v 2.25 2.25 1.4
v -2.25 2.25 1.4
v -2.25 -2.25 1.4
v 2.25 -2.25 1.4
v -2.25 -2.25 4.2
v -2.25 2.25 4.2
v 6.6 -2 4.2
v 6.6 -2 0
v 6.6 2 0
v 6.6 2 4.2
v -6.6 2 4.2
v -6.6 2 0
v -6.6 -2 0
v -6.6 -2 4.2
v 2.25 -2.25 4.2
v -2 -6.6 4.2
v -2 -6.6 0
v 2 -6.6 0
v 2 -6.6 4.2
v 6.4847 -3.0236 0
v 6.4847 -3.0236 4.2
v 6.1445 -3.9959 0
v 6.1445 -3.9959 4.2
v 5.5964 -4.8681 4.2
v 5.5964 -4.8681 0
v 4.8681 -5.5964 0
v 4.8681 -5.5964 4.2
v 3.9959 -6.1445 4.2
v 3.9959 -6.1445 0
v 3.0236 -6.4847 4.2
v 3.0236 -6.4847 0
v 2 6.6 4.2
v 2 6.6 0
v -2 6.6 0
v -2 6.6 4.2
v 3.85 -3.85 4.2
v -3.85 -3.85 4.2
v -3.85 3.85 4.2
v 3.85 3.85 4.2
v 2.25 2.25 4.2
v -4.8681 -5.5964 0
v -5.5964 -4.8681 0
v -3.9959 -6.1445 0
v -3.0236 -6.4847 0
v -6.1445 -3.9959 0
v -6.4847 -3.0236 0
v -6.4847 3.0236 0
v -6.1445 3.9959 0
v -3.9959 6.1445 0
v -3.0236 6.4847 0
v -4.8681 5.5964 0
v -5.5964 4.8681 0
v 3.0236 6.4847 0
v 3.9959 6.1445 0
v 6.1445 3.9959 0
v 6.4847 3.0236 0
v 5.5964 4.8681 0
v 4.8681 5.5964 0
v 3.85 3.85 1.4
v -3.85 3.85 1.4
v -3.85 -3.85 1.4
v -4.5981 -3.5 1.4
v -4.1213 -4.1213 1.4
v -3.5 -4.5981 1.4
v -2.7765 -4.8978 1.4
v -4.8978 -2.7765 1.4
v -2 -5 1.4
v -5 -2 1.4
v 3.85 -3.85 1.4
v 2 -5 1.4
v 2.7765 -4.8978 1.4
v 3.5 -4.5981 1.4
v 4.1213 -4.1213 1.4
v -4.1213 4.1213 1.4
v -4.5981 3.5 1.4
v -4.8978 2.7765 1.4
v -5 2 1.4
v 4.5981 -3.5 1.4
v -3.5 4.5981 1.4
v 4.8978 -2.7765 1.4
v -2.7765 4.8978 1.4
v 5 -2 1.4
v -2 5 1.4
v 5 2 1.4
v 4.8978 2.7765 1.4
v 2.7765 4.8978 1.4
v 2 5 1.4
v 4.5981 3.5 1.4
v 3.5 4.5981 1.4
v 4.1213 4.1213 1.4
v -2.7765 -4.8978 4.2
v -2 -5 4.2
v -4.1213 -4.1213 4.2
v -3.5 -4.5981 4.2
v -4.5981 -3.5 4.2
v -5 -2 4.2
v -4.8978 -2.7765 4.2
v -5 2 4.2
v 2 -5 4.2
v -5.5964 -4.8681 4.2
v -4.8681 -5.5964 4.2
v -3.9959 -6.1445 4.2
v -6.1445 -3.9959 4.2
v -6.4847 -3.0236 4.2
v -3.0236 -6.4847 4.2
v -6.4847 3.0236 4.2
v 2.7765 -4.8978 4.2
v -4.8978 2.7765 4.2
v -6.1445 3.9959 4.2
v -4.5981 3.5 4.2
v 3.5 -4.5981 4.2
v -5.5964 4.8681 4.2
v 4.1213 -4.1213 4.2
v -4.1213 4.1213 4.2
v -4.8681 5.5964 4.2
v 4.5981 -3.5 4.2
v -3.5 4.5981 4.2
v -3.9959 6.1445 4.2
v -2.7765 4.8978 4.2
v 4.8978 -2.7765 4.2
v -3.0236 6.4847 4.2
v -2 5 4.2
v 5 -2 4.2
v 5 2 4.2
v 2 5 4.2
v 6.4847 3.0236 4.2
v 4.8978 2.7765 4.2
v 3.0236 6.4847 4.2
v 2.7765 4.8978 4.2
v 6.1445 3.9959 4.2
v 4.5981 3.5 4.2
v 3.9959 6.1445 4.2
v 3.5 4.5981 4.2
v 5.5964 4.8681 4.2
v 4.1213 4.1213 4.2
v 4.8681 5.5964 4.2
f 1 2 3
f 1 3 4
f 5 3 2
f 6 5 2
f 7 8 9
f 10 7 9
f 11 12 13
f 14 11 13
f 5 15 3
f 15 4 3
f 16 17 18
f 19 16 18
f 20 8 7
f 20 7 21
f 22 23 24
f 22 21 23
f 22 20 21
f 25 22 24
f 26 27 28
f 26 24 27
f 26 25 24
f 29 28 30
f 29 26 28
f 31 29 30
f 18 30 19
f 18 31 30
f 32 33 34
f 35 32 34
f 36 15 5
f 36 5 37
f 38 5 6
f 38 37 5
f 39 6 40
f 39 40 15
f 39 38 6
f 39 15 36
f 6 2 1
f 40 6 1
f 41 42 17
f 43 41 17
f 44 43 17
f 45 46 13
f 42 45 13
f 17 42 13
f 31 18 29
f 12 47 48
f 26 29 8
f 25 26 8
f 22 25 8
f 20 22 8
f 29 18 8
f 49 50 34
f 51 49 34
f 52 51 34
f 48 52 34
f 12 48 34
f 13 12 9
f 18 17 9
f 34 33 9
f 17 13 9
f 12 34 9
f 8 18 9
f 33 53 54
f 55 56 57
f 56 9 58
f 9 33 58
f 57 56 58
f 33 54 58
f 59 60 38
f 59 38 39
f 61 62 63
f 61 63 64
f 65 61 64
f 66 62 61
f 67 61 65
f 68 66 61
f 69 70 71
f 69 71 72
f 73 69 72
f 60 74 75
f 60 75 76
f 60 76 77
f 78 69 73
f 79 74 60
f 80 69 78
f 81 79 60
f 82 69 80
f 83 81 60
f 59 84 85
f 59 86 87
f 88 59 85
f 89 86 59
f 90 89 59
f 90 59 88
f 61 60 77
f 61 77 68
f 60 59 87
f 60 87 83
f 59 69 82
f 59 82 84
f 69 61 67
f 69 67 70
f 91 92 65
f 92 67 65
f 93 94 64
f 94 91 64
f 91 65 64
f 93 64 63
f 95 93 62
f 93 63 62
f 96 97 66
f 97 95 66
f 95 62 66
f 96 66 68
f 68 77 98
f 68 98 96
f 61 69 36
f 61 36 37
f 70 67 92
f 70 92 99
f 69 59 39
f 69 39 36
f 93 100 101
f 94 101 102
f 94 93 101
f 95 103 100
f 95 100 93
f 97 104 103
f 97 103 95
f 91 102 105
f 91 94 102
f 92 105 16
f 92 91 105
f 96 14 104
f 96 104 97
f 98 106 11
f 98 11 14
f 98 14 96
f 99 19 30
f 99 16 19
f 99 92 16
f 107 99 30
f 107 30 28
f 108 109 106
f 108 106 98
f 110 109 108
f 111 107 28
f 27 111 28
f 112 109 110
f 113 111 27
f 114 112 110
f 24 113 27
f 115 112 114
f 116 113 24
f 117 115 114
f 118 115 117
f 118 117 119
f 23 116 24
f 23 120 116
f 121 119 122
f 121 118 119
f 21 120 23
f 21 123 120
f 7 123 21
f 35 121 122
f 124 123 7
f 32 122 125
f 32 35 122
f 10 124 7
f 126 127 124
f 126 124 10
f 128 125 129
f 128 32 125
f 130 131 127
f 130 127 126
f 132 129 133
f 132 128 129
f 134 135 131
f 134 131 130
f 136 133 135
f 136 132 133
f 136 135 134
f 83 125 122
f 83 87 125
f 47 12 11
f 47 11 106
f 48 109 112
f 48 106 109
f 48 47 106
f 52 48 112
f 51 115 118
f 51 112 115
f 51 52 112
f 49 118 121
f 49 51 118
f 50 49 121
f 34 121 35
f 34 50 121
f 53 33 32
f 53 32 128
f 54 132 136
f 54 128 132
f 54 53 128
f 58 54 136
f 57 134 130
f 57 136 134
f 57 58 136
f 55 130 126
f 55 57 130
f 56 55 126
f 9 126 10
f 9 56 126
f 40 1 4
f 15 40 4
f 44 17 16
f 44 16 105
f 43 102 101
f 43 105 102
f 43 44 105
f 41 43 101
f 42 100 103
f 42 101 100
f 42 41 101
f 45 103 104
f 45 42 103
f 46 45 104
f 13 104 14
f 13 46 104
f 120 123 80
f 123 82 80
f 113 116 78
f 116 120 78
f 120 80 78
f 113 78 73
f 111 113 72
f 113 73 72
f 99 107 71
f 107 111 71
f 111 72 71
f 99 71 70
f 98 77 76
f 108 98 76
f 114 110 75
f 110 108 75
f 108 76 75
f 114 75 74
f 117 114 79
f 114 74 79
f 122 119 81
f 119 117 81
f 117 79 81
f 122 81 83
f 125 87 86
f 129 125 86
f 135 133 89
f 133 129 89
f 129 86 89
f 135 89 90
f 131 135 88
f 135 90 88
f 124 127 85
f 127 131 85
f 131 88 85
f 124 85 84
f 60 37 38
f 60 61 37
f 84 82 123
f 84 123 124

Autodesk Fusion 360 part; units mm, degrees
sketch "Boceto1" plane through (0, 0, 0) normal (0, 0, 1) x (1, 0, 0)
  line L0 (2, 5) -> (-2, 5)
  line L1 (-5, 2) -> (-5, -2)
  line L2 (-2, -5) -> (2, -5)
  line L3 (5, -2) -> (5, 2)
  line L4 (5, 5) -> (-5, -5) construction
  line L5 (-5, 5) -> (5, -5) construction
  line L6 (2.25, -2.25) -> (-2.25, -2.25)
  line L7 (-2.25, -2.25) -> (-2.25, 2.25)
  line L8 (-2.25, 2.25) -> (2.25, 2.25)
  line L9 (2.25, 2.25) -> (2.25, -2.25)
  line L10 (2.25, -2.25) -> (-2.25, 2.25) construction
  line L11 (-2.25, -2.25) -> (2.25, 2.25) construction
  line L12 (3.85, -3.85) -> (-3.85, -3.85)
  line L13 (-3.85, -3.85) -> (-3.85, 3.85)
  line L14 (-3.85, 3.85) -> (3.85, 3.85)
  line L15 (3.85, 3.85) -> (3.85, -3.85)
  arc A0 (-2, 5) -> (-5, 2) centre (-2, 2) ccw
  arc A1 (5, 2) -> (2, 5) centre (2, 2) ccw
  arc A2 (2, -5) -> (5, -2) centre (2, -2) ccw
  arc A3 (-5, -2) -> (-2, -5) centre (-2, -2) ccw
  arc A4 (-6.6, -2) -> (-2, -6.6) centre (-2, -2) ccw
  line L16 (-2, -6.6) -> (2, -6.6)
  arc A5 (2, -6.6) -> (6.6, -2) centre (2, -2) ccw
  line L17 (6.6, -2) -> (6.6, 2)
  arc A6 (6.6, 2) -> (2, 6.6) centre (2, 2) ccw
  line L18 (2, 6.6) -> (-2, 6.6)
  arc A7 (-2, 6.6) -> (-6.6, 2) centre (-2, 2) ccw
  line L19 (-6.6, 2) -> (-6.6, -2)
  dimension "d3" = 10
  dimension "d4" = 10
  dimension "d5" = 4.5
  dimension "d6" = 4.5
  dimension "d7" = -1.6
  dimension "d8" = 3
  dimension "d9" = 1.6
extrude "Extruir1" add sketch "Boceto1" along normal blind 1.4 contours L0 L1 L2 L3 A0 A1 A2 A3 | L6 L7 L8 L9 | L12 L13 L14 L15 | A4 L16 A5 L17 A6 L18 A7 L19
extrude "Extruir2" add sketch "Boceto1" along normal blind 2.8 from surface at 1.4 contours L12 L13 L14 L15
extrude "Extruir3" add sketch "Boceto1" along normal up to surface (2.8 mm away) from surface at 1.4 contours A4 L16 A5 L17 A6 L18 A7 L19
